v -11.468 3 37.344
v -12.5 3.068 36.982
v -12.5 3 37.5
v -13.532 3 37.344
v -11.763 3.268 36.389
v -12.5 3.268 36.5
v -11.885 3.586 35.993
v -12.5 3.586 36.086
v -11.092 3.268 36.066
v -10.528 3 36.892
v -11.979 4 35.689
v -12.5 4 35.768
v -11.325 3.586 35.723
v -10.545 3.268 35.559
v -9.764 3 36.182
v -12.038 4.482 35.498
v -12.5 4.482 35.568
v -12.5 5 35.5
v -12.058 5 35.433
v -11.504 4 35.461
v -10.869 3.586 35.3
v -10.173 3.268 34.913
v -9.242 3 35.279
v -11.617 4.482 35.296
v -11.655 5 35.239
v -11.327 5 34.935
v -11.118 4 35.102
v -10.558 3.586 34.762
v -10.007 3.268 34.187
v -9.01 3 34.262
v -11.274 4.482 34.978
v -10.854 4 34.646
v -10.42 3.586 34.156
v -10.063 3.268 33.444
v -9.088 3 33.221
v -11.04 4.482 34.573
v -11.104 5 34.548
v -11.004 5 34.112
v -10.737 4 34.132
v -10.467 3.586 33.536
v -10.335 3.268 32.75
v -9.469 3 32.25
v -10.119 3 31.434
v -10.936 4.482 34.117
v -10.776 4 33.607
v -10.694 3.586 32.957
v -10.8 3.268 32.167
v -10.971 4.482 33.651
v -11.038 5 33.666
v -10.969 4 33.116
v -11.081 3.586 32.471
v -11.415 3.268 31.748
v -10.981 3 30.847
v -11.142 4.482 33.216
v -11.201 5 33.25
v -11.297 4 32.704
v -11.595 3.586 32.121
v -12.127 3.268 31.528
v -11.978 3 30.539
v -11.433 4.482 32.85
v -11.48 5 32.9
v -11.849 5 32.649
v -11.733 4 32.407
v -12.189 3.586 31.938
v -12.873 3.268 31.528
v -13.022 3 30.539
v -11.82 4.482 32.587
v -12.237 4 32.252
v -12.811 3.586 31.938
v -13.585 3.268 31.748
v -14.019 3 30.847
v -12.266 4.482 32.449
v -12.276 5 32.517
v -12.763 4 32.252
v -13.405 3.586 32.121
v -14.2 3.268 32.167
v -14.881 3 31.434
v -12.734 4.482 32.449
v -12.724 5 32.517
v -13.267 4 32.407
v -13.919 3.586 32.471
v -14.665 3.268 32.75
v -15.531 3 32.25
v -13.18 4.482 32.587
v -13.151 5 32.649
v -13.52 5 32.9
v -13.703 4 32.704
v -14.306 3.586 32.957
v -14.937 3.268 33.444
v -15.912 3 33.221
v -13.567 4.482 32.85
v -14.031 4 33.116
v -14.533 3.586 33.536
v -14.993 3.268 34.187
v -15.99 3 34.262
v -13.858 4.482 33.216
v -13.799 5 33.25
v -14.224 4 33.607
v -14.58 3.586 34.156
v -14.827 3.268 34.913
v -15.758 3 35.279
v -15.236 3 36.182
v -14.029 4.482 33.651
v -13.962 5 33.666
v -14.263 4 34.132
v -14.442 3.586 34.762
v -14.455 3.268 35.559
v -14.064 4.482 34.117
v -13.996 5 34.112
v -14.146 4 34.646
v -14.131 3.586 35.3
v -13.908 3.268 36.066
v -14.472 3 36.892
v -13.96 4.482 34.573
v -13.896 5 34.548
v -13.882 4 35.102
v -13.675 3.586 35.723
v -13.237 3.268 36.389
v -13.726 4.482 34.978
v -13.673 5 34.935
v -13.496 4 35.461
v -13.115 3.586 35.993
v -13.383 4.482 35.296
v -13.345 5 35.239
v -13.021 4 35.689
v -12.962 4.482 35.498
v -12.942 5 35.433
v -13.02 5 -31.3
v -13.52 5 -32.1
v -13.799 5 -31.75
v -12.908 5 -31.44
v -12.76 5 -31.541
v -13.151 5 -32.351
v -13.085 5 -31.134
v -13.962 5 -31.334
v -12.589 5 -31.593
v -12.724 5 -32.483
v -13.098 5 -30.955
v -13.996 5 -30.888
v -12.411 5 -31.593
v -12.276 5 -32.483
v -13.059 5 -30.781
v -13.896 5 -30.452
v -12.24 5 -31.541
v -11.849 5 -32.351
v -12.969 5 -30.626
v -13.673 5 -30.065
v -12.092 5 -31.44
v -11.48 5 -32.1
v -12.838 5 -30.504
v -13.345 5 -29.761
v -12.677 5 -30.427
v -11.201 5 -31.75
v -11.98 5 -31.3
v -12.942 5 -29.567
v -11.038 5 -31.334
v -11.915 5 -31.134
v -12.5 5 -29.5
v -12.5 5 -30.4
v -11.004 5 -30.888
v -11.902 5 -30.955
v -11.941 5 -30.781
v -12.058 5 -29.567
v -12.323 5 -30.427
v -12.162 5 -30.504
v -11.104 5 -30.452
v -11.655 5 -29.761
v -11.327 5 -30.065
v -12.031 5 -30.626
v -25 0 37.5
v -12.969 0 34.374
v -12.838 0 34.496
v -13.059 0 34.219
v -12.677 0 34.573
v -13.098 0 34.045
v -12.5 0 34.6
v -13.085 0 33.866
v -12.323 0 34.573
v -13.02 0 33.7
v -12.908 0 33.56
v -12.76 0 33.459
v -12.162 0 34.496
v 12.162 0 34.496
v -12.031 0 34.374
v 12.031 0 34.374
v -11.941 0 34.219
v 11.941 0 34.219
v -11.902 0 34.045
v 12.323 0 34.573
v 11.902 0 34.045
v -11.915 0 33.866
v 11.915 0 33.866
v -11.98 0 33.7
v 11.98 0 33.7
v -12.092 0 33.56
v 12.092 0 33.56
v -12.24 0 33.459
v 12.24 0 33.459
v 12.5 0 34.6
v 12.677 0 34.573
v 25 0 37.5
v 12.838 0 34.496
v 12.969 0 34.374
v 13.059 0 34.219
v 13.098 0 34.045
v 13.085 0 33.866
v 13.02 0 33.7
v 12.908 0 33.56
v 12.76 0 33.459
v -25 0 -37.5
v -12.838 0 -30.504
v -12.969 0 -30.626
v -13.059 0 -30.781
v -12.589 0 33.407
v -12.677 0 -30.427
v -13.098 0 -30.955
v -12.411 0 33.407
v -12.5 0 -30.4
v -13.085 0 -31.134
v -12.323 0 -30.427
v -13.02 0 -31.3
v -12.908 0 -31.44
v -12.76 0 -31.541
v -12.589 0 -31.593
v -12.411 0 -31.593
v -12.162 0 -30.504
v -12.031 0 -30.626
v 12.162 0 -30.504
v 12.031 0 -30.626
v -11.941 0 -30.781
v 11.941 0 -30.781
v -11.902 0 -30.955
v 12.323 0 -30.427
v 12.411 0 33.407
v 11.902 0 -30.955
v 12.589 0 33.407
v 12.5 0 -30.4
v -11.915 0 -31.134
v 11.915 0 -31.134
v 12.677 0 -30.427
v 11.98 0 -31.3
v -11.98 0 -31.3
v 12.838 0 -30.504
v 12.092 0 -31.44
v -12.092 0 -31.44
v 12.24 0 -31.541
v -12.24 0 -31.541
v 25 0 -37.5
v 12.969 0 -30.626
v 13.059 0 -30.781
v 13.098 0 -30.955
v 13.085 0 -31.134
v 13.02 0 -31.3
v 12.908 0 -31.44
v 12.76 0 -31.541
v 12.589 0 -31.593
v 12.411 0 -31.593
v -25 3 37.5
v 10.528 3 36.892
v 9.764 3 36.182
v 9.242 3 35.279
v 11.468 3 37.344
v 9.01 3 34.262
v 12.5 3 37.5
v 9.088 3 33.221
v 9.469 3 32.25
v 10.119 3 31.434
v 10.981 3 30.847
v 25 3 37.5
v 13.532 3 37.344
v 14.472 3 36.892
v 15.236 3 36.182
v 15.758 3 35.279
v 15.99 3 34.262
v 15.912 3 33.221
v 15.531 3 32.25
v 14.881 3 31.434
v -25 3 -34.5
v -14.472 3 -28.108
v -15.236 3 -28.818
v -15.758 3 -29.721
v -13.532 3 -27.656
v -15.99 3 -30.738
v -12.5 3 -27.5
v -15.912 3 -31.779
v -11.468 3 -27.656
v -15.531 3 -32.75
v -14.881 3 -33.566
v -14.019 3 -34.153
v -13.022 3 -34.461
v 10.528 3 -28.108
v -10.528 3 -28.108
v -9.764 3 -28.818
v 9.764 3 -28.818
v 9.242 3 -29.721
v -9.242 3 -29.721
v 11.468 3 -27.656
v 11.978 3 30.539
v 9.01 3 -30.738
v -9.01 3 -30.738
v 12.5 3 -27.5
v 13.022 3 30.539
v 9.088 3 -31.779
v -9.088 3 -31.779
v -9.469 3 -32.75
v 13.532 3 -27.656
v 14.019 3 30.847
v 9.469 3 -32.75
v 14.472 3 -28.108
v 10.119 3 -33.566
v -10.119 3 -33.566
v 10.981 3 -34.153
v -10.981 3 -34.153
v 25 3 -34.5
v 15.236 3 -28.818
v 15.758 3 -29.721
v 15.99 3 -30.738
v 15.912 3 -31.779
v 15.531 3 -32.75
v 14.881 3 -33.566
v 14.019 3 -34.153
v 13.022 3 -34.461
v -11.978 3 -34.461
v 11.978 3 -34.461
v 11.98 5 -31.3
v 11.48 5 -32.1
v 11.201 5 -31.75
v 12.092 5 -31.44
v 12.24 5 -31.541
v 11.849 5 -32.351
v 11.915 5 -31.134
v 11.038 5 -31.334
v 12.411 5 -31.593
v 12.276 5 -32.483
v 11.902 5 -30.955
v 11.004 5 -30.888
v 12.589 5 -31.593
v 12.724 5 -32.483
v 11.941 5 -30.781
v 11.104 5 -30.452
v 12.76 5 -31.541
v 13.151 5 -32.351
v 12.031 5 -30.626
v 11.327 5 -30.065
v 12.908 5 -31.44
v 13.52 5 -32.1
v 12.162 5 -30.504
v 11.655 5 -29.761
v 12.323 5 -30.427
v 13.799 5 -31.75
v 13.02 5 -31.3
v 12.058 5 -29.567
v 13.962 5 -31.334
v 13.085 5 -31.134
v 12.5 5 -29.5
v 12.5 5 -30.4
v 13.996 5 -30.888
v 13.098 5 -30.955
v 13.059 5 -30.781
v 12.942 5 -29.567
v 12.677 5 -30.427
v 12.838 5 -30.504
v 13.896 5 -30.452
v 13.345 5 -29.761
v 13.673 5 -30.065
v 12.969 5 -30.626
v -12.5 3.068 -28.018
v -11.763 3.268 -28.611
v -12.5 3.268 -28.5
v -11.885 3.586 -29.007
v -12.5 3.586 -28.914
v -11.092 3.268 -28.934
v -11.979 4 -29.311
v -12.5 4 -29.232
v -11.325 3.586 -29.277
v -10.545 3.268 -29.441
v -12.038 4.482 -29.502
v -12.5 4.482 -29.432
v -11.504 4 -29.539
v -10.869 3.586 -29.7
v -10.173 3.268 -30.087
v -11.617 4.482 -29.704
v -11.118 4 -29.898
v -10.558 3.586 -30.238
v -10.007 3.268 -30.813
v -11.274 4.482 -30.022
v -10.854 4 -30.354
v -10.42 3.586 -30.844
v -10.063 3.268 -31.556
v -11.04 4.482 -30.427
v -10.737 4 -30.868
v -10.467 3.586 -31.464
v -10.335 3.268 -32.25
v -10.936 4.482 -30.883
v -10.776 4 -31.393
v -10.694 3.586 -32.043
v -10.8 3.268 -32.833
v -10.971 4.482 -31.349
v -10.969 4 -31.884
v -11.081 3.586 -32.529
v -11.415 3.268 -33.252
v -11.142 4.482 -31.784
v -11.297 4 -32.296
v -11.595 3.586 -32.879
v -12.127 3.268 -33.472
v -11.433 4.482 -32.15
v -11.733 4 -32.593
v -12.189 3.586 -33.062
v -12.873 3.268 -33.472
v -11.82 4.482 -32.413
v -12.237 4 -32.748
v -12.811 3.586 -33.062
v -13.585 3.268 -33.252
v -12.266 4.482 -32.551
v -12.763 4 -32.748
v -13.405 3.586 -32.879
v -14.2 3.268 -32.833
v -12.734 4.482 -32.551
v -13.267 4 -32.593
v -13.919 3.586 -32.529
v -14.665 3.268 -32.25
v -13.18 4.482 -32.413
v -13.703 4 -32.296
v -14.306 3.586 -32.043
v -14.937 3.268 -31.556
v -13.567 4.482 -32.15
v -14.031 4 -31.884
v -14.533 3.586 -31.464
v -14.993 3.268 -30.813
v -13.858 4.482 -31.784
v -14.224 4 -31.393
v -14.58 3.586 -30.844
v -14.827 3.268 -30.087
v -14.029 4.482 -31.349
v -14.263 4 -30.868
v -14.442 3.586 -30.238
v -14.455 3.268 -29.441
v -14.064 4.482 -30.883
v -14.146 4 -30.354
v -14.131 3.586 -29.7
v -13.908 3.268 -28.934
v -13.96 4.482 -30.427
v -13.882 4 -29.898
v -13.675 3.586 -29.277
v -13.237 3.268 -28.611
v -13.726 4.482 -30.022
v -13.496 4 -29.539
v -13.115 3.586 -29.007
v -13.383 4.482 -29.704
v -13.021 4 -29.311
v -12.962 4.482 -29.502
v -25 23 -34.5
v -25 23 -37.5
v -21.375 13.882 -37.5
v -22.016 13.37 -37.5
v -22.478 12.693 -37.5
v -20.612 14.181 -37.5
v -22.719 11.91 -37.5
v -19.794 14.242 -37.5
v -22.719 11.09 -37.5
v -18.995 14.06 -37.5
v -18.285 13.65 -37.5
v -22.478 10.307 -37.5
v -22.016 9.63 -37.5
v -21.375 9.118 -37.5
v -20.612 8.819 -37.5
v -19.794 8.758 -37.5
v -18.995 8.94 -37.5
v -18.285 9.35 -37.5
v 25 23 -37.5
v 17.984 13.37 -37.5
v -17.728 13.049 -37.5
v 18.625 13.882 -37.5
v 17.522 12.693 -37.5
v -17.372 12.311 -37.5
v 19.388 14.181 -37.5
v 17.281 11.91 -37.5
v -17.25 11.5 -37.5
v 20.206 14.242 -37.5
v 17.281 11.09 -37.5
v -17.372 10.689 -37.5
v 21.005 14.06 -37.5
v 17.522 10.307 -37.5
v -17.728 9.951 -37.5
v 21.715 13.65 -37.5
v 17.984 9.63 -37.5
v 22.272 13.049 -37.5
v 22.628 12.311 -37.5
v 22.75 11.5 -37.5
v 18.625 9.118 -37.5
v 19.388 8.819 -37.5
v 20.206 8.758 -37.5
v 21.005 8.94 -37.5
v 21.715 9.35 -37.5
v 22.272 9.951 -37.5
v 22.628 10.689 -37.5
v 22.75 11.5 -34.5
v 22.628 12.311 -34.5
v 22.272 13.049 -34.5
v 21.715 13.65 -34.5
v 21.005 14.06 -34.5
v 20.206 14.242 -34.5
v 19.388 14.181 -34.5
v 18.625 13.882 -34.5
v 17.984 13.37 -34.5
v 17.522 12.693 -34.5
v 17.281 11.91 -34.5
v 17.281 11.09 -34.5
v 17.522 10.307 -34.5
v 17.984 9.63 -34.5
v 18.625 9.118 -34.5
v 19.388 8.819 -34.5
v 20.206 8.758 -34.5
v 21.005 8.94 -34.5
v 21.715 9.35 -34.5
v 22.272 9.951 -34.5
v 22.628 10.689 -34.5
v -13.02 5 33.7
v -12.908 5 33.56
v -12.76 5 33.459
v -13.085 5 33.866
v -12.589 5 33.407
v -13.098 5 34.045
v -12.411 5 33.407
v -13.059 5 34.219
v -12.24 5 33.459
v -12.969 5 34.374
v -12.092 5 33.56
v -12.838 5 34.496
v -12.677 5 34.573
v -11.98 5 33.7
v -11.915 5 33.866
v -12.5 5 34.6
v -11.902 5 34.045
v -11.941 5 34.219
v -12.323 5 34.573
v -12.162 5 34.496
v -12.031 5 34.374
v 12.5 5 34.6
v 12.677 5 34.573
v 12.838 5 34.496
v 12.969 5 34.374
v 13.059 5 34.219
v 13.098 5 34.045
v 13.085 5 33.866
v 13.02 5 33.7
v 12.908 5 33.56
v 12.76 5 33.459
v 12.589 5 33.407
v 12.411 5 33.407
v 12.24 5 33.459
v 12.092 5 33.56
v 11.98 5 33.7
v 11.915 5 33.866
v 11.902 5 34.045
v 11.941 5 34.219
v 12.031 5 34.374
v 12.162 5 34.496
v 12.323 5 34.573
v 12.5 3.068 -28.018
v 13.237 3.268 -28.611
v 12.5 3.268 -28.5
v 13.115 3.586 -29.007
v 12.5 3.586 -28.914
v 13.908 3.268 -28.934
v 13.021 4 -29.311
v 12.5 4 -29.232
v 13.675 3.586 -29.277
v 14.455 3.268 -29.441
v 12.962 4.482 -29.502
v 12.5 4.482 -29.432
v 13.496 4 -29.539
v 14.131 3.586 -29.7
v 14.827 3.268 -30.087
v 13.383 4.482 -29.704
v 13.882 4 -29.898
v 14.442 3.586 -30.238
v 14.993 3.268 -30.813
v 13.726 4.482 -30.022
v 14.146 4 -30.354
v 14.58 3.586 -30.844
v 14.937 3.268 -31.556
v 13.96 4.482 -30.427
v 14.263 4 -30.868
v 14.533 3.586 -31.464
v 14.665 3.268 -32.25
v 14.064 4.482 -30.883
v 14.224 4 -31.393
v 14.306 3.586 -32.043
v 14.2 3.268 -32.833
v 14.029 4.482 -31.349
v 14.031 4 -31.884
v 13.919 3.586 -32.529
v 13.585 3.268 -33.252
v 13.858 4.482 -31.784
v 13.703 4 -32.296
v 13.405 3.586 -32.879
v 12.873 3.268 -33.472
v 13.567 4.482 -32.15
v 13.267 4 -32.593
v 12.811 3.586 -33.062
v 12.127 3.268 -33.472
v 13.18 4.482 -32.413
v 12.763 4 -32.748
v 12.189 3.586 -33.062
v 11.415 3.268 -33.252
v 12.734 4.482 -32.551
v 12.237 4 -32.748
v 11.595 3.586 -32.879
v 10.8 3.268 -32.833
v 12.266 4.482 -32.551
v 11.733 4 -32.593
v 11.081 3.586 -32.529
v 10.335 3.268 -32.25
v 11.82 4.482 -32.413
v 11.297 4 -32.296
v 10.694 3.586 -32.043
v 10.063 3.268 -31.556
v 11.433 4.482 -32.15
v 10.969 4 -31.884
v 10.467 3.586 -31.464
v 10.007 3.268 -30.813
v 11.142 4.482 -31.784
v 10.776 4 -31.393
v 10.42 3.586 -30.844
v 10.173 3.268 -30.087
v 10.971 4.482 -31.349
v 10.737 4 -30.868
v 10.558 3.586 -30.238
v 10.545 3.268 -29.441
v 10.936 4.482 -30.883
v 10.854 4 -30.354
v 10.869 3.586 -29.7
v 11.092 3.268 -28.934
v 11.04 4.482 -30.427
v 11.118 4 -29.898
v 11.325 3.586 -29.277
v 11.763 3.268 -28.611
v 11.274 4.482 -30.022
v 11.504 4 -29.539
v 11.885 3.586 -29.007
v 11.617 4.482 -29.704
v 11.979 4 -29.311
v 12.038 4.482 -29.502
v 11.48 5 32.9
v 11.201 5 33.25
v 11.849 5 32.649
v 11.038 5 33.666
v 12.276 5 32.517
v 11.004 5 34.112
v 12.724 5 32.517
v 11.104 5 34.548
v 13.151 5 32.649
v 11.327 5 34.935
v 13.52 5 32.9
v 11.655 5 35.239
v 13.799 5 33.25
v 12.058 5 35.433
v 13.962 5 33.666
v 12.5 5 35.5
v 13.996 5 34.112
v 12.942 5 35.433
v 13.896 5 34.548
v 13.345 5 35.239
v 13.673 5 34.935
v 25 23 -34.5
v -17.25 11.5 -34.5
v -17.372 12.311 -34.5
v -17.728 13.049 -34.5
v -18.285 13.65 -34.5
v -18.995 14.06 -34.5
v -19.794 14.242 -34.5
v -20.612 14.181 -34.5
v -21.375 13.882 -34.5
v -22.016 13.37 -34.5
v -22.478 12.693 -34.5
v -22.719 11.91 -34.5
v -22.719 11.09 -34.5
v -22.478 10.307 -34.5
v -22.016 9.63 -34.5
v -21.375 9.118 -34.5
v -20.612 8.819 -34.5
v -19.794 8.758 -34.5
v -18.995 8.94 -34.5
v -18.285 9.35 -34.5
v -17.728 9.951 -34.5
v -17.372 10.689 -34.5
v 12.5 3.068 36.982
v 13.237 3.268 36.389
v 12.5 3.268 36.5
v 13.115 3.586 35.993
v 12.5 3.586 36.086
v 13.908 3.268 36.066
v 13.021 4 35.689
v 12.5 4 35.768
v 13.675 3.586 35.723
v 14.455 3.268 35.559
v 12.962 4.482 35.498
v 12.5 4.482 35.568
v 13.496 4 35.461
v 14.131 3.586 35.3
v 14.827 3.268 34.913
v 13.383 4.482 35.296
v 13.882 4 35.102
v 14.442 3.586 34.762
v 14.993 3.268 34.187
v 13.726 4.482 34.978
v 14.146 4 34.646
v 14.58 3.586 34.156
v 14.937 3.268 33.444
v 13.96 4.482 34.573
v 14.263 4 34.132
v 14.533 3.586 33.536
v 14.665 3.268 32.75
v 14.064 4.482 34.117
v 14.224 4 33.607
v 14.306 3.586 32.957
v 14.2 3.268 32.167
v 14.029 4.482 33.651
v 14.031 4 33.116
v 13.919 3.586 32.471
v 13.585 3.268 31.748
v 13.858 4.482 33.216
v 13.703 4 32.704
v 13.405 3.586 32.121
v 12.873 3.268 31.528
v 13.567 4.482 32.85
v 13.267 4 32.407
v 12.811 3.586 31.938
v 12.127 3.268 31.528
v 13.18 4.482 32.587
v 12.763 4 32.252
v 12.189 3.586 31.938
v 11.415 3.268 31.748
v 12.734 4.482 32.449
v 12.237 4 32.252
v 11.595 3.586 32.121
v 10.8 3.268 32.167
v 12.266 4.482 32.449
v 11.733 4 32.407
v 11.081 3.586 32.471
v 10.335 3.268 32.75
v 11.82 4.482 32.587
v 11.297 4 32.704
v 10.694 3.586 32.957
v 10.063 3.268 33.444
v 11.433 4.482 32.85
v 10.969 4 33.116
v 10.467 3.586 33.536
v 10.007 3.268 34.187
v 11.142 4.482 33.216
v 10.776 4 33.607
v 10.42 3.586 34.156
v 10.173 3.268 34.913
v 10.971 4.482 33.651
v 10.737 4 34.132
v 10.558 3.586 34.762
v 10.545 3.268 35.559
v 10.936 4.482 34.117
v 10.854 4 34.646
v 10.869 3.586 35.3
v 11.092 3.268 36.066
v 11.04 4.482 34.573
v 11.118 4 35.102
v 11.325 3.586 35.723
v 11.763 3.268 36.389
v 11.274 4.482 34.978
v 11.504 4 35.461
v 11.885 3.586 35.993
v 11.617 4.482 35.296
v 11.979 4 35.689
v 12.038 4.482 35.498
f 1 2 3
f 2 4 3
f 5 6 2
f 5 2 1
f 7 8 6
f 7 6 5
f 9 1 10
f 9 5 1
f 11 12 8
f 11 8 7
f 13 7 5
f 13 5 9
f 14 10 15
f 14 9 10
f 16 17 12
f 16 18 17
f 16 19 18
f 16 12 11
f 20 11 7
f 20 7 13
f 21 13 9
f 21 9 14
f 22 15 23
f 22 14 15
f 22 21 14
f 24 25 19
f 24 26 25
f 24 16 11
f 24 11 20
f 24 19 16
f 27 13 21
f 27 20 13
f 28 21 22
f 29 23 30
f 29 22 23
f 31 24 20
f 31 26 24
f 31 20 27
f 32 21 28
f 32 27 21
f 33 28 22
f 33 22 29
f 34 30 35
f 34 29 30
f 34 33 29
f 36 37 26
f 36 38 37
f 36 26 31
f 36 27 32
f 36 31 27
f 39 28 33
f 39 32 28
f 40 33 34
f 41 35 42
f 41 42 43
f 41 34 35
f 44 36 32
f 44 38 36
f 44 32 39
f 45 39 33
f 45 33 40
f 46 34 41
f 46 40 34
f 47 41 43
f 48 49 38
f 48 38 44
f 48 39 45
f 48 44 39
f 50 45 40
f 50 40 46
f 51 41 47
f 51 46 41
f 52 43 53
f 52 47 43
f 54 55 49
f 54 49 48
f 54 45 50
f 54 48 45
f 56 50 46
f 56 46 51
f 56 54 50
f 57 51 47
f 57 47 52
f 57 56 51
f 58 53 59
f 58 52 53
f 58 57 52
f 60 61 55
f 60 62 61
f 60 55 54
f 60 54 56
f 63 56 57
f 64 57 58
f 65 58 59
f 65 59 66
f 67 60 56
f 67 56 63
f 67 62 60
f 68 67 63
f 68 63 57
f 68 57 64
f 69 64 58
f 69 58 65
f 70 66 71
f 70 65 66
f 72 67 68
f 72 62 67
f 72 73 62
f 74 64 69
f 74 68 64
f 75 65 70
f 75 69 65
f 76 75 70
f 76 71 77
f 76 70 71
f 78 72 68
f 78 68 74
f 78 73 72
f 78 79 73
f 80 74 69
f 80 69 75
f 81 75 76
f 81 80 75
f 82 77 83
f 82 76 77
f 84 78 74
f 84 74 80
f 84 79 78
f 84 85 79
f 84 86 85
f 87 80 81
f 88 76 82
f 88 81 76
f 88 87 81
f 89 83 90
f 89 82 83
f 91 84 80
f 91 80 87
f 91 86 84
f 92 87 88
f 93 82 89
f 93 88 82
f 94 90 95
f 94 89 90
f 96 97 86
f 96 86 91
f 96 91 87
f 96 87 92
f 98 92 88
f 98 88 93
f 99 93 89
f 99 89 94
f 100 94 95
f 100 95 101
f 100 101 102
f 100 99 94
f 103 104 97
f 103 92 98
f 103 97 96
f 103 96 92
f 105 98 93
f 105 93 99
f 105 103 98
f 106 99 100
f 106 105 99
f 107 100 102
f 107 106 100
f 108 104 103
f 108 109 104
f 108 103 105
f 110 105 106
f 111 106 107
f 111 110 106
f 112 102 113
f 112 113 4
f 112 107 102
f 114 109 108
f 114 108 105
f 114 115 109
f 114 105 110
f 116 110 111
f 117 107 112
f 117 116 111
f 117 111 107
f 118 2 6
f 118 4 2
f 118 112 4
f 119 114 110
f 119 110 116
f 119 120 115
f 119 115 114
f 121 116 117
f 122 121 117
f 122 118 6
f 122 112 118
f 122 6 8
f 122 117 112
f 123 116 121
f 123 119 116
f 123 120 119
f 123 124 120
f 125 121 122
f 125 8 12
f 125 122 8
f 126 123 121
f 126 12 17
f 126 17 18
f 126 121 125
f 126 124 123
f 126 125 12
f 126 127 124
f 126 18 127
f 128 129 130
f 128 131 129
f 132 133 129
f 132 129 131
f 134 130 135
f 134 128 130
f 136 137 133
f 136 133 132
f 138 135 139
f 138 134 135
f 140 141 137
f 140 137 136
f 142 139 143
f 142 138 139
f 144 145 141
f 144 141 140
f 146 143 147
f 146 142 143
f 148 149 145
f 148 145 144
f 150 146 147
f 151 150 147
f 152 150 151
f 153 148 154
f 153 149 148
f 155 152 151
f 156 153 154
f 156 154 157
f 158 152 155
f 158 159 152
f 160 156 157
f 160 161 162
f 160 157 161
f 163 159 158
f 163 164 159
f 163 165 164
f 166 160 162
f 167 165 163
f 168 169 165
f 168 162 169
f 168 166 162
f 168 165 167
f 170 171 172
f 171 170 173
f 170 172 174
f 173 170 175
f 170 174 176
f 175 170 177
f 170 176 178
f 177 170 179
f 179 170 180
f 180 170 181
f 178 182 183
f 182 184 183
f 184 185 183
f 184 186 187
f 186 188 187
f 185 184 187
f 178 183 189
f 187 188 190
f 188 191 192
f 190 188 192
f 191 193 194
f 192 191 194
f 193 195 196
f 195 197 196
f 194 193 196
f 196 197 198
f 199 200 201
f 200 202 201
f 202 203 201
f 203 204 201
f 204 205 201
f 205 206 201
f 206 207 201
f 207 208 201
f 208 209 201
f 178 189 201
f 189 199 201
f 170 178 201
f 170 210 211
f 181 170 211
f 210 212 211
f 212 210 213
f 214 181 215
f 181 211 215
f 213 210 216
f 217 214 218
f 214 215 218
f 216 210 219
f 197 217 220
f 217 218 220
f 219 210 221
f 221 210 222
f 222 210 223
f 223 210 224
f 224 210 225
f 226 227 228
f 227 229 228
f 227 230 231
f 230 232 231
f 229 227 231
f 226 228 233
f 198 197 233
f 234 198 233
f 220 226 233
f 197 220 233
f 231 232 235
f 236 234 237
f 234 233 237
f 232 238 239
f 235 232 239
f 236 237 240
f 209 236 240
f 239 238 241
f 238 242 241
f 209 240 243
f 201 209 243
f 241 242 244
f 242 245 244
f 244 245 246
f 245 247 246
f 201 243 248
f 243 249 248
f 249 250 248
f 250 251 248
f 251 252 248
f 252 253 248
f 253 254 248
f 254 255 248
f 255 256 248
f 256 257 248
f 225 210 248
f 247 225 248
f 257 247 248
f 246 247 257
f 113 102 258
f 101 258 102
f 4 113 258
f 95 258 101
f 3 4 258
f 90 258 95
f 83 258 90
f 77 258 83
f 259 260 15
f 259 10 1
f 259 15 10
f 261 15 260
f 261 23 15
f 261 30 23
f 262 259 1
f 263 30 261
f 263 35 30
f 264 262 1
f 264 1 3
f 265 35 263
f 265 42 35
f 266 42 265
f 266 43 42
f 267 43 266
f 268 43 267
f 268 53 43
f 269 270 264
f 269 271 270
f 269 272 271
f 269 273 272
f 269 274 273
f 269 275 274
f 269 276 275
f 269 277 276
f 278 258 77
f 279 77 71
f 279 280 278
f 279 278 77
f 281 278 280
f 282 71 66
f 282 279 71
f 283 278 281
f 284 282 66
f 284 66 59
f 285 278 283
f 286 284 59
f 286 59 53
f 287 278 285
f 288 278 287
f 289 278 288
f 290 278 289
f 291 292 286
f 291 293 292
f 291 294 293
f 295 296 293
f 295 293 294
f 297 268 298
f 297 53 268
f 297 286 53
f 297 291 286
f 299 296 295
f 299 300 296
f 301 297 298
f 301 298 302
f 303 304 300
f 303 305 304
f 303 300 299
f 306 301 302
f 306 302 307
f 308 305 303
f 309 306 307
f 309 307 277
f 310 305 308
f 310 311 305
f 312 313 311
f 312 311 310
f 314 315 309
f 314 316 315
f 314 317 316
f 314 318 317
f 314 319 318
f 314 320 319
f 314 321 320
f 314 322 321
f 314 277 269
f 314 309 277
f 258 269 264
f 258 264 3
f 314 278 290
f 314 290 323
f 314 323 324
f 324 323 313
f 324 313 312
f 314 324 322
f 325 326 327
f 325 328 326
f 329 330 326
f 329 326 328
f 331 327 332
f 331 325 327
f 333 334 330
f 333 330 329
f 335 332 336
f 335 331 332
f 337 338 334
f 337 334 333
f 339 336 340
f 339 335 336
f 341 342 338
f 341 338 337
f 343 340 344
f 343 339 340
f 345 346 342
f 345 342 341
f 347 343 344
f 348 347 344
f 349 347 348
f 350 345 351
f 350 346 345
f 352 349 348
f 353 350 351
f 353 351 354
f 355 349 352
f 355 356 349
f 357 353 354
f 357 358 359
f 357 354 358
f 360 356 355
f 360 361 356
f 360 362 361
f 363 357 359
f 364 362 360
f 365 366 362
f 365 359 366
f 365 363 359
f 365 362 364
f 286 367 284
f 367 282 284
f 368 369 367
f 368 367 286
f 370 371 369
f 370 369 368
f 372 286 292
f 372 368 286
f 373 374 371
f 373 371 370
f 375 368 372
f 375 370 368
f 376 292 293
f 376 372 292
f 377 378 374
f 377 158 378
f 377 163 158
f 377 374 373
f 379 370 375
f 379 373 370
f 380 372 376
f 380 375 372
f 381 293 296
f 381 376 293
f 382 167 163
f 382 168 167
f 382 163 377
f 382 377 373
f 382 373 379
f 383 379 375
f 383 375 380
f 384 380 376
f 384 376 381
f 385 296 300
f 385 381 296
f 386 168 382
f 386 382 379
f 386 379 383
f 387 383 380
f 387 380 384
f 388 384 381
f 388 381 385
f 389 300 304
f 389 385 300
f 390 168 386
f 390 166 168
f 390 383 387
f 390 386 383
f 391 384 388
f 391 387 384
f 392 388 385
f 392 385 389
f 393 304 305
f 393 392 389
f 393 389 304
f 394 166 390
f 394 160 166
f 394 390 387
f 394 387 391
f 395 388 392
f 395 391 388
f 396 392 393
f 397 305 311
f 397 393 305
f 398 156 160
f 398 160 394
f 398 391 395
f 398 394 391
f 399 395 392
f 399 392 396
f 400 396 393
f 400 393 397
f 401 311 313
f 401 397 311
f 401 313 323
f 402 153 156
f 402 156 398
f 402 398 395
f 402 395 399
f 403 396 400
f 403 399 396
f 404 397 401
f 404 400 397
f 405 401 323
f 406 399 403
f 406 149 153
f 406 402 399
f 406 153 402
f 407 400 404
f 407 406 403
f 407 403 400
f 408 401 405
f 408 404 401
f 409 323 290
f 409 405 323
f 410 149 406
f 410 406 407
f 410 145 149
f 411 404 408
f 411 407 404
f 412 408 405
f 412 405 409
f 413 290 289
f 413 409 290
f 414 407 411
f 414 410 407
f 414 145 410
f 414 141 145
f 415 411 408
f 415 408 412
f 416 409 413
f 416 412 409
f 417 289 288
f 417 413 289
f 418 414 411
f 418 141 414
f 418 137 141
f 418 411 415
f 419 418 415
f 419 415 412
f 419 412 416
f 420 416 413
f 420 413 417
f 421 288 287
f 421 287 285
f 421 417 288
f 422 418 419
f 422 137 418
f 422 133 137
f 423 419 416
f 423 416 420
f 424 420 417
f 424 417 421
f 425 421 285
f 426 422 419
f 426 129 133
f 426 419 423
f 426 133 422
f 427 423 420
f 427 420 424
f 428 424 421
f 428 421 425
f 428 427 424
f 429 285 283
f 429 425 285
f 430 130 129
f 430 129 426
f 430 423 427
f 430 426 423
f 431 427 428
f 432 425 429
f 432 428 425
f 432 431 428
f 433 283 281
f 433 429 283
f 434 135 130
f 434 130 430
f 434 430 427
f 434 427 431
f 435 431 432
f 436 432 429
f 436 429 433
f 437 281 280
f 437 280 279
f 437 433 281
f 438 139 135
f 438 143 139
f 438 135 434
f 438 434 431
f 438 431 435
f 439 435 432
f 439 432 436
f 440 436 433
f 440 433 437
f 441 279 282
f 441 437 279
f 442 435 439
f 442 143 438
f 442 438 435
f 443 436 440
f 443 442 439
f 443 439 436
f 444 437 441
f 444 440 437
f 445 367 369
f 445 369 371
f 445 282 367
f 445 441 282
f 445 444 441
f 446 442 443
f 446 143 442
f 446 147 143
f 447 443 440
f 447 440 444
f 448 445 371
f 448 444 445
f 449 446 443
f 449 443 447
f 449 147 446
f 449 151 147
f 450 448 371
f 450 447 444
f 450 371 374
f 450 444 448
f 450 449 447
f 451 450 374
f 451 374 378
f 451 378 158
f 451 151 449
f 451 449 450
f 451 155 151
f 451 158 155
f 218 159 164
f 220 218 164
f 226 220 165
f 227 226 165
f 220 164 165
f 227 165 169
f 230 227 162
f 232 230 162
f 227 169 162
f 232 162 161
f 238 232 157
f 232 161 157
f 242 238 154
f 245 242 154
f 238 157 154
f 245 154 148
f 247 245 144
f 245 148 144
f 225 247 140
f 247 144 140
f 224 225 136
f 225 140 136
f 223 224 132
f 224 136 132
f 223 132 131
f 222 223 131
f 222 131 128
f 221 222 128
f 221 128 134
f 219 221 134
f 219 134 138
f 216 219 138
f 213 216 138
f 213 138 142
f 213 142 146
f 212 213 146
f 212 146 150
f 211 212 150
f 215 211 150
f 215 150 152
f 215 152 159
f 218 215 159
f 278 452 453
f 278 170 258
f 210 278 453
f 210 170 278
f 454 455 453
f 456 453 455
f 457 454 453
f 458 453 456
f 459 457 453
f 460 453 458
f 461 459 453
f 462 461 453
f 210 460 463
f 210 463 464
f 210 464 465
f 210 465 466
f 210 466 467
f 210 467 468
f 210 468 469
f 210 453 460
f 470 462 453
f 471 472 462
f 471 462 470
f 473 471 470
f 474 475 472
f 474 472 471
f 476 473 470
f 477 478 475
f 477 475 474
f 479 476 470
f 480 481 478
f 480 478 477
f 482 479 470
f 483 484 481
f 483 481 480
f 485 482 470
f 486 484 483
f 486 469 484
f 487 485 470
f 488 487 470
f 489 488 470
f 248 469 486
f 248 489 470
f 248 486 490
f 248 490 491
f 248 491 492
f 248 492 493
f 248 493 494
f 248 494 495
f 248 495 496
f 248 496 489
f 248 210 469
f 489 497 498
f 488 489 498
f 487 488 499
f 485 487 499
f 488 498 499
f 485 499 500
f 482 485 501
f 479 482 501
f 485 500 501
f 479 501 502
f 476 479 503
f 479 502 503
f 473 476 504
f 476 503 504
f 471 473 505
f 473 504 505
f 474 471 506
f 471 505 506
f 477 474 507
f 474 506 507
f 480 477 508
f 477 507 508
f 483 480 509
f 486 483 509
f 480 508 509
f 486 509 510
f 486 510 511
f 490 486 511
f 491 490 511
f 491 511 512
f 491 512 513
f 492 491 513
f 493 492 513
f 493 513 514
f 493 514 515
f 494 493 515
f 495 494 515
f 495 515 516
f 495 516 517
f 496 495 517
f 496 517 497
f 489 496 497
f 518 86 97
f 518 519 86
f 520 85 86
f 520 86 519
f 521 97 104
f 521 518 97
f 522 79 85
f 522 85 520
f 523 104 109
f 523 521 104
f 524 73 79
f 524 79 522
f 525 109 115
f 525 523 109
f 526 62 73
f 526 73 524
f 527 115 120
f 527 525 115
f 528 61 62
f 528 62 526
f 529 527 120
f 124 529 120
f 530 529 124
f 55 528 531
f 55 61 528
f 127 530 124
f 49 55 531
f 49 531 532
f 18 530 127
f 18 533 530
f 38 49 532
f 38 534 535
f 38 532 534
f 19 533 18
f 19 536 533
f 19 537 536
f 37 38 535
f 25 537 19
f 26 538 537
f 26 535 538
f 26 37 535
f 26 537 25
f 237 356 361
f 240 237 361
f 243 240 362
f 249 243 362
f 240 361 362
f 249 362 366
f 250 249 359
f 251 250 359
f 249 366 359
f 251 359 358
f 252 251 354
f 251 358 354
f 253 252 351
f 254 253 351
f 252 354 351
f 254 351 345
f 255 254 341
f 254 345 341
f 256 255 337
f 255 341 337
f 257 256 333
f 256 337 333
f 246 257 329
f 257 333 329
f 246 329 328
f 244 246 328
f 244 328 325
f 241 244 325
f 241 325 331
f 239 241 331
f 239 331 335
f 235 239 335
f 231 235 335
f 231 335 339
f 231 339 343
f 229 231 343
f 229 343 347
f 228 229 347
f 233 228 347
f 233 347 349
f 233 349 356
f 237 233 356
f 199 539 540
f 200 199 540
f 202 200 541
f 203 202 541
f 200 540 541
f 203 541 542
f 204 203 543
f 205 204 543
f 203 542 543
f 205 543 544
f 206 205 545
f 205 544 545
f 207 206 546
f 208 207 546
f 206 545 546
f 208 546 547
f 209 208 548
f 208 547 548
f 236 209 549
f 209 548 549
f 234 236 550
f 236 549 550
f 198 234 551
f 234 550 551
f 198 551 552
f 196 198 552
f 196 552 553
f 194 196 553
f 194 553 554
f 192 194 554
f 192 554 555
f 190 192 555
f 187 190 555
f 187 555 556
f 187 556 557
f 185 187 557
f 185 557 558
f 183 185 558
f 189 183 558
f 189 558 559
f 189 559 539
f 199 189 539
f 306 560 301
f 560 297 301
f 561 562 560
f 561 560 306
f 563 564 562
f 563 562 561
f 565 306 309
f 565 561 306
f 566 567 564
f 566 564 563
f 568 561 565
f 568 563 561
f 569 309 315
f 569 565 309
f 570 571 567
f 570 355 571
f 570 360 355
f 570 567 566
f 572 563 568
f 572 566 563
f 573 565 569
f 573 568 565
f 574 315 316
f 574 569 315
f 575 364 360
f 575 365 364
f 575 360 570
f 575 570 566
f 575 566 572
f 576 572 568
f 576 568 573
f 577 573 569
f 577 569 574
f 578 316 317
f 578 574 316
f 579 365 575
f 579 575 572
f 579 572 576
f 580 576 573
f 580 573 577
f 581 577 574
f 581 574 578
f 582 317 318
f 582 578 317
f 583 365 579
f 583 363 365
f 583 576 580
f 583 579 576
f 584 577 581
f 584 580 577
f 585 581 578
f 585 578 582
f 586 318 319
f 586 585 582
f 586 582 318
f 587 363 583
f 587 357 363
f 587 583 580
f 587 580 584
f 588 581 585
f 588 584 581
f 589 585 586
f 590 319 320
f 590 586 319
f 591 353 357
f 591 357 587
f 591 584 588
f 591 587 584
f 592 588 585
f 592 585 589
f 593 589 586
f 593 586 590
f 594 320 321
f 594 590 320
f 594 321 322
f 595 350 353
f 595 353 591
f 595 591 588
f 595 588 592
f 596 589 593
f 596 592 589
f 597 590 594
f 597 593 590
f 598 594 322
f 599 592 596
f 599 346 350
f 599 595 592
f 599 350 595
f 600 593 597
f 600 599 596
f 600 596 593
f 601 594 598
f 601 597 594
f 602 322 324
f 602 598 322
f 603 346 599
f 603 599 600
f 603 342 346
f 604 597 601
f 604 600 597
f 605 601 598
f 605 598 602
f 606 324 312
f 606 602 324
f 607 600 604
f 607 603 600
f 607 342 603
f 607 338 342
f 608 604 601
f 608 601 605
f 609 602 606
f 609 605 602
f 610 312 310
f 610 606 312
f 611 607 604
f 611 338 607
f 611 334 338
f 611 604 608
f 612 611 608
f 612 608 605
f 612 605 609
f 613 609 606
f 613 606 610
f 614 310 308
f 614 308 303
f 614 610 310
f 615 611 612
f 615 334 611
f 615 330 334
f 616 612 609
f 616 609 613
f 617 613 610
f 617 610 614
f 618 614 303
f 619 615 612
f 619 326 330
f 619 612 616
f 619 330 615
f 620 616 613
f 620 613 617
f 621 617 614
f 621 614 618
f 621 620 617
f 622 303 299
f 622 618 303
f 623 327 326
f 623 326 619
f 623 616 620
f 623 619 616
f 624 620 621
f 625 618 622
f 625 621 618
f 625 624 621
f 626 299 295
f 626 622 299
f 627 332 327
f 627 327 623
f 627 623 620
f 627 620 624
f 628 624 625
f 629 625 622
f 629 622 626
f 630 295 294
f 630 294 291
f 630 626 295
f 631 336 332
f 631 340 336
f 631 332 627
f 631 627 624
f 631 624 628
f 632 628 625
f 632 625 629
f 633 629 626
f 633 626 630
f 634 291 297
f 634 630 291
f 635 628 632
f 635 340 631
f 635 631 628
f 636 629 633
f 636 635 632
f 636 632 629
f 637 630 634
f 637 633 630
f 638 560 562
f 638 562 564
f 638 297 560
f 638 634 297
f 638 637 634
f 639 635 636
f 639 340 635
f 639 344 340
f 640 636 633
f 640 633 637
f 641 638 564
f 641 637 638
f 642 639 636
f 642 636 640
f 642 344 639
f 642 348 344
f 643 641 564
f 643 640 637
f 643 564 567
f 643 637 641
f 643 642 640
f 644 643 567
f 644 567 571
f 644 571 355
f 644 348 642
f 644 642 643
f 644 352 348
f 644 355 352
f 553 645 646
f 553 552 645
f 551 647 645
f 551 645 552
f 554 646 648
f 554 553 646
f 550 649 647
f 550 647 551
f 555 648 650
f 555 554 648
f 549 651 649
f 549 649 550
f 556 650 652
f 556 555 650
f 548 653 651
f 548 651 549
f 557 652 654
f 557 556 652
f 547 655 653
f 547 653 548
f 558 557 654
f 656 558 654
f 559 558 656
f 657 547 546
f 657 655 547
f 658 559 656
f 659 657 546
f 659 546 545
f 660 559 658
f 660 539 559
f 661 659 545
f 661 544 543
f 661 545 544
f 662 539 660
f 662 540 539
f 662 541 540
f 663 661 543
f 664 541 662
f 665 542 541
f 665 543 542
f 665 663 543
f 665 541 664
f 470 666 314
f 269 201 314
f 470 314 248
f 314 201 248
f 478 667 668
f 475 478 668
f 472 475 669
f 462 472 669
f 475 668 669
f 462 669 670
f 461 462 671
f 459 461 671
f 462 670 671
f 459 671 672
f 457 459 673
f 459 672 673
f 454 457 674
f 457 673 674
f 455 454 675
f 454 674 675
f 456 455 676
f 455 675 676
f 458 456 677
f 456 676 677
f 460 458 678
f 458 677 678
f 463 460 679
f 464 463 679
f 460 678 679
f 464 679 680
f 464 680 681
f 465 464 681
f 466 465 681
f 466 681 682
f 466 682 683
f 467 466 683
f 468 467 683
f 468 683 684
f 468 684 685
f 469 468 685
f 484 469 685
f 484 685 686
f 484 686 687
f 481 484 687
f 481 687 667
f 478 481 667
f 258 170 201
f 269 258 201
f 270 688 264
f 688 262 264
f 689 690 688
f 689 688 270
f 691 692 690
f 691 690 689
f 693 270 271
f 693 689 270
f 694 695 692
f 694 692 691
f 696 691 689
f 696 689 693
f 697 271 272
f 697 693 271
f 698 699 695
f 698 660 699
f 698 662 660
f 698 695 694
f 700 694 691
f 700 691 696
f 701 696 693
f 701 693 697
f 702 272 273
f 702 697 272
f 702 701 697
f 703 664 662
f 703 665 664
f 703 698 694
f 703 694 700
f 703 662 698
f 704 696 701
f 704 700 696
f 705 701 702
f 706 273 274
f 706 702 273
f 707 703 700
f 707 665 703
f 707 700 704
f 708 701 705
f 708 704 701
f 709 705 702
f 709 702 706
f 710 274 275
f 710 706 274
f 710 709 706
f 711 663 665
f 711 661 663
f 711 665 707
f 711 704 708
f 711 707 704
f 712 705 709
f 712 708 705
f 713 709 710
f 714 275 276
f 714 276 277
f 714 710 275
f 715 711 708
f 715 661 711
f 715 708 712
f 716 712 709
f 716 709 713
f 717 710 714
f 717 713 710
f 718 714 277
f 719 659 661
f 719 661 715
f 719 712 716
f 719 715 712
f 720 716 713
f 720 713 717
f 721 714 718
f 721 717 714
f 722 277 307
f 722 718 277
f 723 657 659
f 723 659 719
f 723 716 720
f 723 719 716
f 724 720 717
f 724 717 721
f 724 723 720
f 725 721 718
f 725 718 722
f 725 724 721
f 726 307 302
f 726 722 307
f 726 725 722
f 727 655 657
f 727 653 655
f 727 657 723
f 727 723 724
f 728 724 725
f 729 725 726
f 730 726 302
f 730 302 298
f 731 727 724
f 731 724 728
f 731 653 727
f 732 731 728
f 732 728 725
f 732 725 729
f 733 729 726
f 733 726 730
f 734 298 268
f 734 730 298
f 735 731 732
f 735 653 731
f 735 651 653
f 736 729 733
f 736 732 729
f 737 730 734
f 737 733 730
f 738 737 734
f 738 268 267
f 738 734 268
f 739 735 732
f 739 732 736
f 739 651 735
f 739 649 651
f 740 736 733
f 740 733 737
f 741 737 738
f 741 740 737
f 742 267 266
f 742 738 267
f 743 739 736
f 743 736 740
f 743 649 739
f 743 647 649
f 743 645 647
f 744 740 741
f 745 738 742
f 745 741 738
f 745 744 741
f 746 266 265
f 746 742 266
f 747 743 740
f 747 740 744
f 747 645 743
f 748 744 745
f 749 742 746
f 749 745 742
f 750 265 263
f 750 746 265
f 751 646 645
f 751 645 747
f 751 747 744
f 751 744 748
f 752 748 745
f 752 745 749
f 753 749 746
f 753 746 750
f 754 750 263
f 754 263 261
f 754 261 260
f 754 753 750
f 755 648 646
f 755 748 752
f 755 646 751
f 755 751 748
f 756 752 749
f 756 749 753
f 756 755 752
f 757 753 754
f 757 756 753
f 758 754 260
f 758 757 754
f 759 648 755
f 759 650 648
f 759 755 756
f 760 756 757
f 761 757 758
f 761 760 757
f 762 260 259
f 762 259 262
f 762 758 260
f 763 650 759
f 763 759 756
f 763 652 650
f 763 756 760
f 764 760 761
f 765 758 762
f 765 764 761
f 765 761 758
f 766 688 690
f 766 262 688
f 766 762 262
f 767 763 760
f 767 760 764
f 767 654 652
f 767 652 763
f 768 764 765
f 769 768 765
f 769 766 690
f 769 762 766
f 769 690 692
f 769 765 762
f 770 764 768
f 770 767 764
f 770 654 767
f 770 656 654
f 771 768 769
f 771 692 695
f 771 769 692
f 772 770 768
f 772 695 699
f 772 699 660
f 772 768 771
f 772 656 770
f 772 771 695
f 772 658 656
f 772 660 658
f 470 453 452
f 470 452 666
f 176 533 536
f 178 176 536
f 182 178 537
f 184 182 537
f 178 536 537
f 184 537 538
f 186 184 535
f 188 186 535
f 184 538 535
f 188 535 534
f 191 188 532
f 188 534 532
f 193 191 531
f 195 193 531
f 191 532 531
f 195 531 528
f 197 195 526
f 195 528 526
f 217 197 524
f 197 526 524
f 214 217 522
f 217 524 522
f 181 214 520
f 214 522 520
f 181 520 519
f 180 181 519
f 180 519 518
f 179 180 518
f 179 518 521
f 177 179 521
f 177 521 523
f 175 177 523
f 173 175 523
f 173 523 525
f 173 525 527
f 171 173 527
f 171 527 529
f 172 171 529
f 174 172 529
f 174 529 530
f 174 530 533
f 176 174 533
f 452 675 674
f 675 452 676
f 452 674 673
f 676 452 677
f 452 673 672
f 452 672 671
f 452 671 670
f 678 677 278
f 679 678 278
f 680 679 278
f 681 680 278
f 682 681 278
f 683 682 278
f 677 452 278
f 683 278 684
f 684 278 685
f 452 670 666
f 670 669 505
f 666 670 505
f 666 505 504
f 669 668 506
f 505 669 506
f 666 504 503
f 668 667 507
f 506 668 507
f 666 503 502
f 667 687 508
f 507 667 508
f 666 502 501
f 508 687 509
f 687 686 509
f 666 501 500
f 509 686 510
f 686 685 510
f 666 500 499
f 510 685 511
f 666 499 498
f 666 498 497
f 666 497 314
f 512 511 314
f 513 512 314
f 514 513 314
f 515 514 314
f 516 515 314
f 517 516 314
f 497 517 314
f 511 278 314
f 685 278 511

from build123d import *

# Parameters (mm, degrees)
SKETCH1_W                      = 50
SKETCH1_H                      = 75
BOSS_EXTRUDE1_DEPTH            = 3
SKETCH2_W                      = 50
SKETCH2_H                      = 3
BOSS_EXTRUDE2_DEPTH            = 20
M5_CLEARANCE_HOLE1_D           = 5.5
M5_CLEARANCE_HOLE1_ON_FACE_2_D = 5.5
SKETCH6_R                      = 1.5
BOSS_EXTRUDE3_DEPTH            = 2
CUT_EXTRUDE1_REACH             = 50.531
SKETCH7_R                      = 0.6
FILLET1_R                      = 2


with BuildPart() as part:
    # Sketch1 → Boss-Extrude1 (new body)
    with BuildSketch(Plane(origin=(0, 0, 0), x_dir=(1, 0, 0), z_dir=(0, 1, 0))):
        Rectangle(SKETCH1_W, SKETCH1_H)
    extrude(amount=BOSS_EXTRUDE1_DEPTH)

    # Sketch2 → Boss-Extrude2 (add)
    with BuildSketch(Plane(origin=(0, 3, 0), x_dir=(1, 0, 0), z_dir=(0, 1, 0))):
        with Locations((0, 36)):
            Rectangle(SKETCH2_W, SKETCH2_H)
    extrude(amount=BOSS_EXTRUDE2_DEPTH)

    # M5 Clearance Hole1 (through all)
    with Locations(Plane(origin=(20, 11.5, -37.5), x_dir=(-1, 0, 0), z_dir=(0, 0, -1))):
        with Locations((0, 0), (40, 0)):
            Hole(M5_CLEARANCE_HOLE1_D / 2)

    # M5 Clearance Hole1 on face 2 (through all)
    with Locations(Plane(origin=(-94.663434395, 64.222873605, 0), x_dir=(-1, 0, 0), z_dir=(0, 0, -1))):
        with Locations((0, 0)):
            Hole(M5_CLEARANCE_HOLE1_ON_FACE_2_D / 2)

    # Sketch6 → Boss-Extrude3 (add)
    with BuildSketch(Plane(origin=(0, 3, 0), x_dir=(1, 0, 0), z_dir=(0, 1, 0))):
        with Locations(Location((-12.5, 31, 0), (0, 0, 270))):
            Circle(SKETCH6_R)
        with Locations(Location((12.5, 31, 0), (0, 0, 270))):
            Circle(SKETCH6_R)
        with Locations(Location((12.5, -34, 0), (0, 0, 270))):
            Circle(SKETCH6_R)
        with Locations(Location((-12.5, -34, 0), (0, 0, 270))):
            Circle(SKETCH6_R)
    extrude(amount=BOSS_EXTRUDE3_DEPTH)

    # Sketch7 → Cut-Extrude1 (cut, up to next)
    with BuildSketch(Plane(origin=(0, 5, 0), x_dir=(1, 0, 0), z_dir=(0, 1, 0)), mode=Mode.PRIVATE) as cut_extrude1_sk1:
        with Locations(Location((-12.5, 31, 0), (0, 0, 270))):
            Circle(SKETCH7_R)
    cut_extrude1_tool1 = extrude(cut_extrude1_sk1.sketch, amount=-CUT_EXTRUDE1_REACH, mode=Mode.PRIVATE) & part.part
    # Sketch7 → Cut-Extrude1 (cut, up to next)
    with BuildSketch(Plane(origin=(0, 5, 0), x_dir=(1, 0, 0), z_dir=(0, 1, 0)), mode=Mode.PRIVATE) as cut_extrude1_sk2:
        with Locations(Location((12.5, 31, 0), (0, 0, 270))):
            Circle(SKETCH7_R)
    cut_extrude1_tool2 = extrude(cut_extrude1_sk2.sketch, amount=-CUT_EXTRUDE1_REACH, mode=Mode.PRIVATE) & part.part
    # Sketch7 → Cut-Extrude1 (cut, up to next)
    with BuildSketch(Plane(origin=(0, 5, 0), x_dir=(1, 0, 0), z_dir=(0, 1, 0)), mode=Mode.PRIVATE) as cut_extrude1_sk3:
        with Locations(Location((12.5, -34, 0), (0, 0, 270))):
            Circle(SKETCH7_R)
    cut_extrude1_tool3 = extrude(cut_extrude1_sk3.sketch, amount=-CUT_EXTRUDE1_REACH, mode=Mode.PRIVATE) & part.part
    # Sketch7 → Cut-Extrude1 (cut, up to next)
    with BuildSketch(Plane(origin=(0, 5, 0), x_dir=(1, 0, 0), z_dir=(0, 1, 0)), mode=Mode.PRIVATE) as cut_extrude1_sk4:
        with Locations(Location((-12.5, -34, 0), (0, 0, 270))):
            Circle(SKETCH7_R)
    cut_extrude1_tool4 = extrude(cut_extrude1_sk4.sketch, amount=-CUT_EXTRUDE1_REACH, mode=Mode.PRIVATE) & part.part
    add(cut_extrude1_tool1.solids().sort_by_distance((-12.5, 5, -31))[0], mode=Mode.SUBTRACT)
    add(cut_extrude1_tool2.solids().sort_by_distance((12.5, 5, -31))[0], mode=Mode.SUBTRACT)
    add(cut_extrude1_tool3.solids().sort_by_distance((12.5, 5, 34))[0], mode=Mode.SUBTRACT)
    add(cut_extrude1_tool4.solids().sort_by_distance((-12.5, 5, 34))[0], mode=Mode.SUBTRACT)

    # Fillet1
    fillet1_edges = [part.edges().sort_by_distance(p)[0] for p in [
        (-12.5, 3, -32.5),
        (12.5, 3, -32.5),
        (12.5, 3, 32.5),
        (-12.5, 3, 32.5),
    ]]
    fillet(fillet1_edges, radius=FILLET1_R - 0.0001)  # a hair under: the kernel refuses the full size


solid = part.part
